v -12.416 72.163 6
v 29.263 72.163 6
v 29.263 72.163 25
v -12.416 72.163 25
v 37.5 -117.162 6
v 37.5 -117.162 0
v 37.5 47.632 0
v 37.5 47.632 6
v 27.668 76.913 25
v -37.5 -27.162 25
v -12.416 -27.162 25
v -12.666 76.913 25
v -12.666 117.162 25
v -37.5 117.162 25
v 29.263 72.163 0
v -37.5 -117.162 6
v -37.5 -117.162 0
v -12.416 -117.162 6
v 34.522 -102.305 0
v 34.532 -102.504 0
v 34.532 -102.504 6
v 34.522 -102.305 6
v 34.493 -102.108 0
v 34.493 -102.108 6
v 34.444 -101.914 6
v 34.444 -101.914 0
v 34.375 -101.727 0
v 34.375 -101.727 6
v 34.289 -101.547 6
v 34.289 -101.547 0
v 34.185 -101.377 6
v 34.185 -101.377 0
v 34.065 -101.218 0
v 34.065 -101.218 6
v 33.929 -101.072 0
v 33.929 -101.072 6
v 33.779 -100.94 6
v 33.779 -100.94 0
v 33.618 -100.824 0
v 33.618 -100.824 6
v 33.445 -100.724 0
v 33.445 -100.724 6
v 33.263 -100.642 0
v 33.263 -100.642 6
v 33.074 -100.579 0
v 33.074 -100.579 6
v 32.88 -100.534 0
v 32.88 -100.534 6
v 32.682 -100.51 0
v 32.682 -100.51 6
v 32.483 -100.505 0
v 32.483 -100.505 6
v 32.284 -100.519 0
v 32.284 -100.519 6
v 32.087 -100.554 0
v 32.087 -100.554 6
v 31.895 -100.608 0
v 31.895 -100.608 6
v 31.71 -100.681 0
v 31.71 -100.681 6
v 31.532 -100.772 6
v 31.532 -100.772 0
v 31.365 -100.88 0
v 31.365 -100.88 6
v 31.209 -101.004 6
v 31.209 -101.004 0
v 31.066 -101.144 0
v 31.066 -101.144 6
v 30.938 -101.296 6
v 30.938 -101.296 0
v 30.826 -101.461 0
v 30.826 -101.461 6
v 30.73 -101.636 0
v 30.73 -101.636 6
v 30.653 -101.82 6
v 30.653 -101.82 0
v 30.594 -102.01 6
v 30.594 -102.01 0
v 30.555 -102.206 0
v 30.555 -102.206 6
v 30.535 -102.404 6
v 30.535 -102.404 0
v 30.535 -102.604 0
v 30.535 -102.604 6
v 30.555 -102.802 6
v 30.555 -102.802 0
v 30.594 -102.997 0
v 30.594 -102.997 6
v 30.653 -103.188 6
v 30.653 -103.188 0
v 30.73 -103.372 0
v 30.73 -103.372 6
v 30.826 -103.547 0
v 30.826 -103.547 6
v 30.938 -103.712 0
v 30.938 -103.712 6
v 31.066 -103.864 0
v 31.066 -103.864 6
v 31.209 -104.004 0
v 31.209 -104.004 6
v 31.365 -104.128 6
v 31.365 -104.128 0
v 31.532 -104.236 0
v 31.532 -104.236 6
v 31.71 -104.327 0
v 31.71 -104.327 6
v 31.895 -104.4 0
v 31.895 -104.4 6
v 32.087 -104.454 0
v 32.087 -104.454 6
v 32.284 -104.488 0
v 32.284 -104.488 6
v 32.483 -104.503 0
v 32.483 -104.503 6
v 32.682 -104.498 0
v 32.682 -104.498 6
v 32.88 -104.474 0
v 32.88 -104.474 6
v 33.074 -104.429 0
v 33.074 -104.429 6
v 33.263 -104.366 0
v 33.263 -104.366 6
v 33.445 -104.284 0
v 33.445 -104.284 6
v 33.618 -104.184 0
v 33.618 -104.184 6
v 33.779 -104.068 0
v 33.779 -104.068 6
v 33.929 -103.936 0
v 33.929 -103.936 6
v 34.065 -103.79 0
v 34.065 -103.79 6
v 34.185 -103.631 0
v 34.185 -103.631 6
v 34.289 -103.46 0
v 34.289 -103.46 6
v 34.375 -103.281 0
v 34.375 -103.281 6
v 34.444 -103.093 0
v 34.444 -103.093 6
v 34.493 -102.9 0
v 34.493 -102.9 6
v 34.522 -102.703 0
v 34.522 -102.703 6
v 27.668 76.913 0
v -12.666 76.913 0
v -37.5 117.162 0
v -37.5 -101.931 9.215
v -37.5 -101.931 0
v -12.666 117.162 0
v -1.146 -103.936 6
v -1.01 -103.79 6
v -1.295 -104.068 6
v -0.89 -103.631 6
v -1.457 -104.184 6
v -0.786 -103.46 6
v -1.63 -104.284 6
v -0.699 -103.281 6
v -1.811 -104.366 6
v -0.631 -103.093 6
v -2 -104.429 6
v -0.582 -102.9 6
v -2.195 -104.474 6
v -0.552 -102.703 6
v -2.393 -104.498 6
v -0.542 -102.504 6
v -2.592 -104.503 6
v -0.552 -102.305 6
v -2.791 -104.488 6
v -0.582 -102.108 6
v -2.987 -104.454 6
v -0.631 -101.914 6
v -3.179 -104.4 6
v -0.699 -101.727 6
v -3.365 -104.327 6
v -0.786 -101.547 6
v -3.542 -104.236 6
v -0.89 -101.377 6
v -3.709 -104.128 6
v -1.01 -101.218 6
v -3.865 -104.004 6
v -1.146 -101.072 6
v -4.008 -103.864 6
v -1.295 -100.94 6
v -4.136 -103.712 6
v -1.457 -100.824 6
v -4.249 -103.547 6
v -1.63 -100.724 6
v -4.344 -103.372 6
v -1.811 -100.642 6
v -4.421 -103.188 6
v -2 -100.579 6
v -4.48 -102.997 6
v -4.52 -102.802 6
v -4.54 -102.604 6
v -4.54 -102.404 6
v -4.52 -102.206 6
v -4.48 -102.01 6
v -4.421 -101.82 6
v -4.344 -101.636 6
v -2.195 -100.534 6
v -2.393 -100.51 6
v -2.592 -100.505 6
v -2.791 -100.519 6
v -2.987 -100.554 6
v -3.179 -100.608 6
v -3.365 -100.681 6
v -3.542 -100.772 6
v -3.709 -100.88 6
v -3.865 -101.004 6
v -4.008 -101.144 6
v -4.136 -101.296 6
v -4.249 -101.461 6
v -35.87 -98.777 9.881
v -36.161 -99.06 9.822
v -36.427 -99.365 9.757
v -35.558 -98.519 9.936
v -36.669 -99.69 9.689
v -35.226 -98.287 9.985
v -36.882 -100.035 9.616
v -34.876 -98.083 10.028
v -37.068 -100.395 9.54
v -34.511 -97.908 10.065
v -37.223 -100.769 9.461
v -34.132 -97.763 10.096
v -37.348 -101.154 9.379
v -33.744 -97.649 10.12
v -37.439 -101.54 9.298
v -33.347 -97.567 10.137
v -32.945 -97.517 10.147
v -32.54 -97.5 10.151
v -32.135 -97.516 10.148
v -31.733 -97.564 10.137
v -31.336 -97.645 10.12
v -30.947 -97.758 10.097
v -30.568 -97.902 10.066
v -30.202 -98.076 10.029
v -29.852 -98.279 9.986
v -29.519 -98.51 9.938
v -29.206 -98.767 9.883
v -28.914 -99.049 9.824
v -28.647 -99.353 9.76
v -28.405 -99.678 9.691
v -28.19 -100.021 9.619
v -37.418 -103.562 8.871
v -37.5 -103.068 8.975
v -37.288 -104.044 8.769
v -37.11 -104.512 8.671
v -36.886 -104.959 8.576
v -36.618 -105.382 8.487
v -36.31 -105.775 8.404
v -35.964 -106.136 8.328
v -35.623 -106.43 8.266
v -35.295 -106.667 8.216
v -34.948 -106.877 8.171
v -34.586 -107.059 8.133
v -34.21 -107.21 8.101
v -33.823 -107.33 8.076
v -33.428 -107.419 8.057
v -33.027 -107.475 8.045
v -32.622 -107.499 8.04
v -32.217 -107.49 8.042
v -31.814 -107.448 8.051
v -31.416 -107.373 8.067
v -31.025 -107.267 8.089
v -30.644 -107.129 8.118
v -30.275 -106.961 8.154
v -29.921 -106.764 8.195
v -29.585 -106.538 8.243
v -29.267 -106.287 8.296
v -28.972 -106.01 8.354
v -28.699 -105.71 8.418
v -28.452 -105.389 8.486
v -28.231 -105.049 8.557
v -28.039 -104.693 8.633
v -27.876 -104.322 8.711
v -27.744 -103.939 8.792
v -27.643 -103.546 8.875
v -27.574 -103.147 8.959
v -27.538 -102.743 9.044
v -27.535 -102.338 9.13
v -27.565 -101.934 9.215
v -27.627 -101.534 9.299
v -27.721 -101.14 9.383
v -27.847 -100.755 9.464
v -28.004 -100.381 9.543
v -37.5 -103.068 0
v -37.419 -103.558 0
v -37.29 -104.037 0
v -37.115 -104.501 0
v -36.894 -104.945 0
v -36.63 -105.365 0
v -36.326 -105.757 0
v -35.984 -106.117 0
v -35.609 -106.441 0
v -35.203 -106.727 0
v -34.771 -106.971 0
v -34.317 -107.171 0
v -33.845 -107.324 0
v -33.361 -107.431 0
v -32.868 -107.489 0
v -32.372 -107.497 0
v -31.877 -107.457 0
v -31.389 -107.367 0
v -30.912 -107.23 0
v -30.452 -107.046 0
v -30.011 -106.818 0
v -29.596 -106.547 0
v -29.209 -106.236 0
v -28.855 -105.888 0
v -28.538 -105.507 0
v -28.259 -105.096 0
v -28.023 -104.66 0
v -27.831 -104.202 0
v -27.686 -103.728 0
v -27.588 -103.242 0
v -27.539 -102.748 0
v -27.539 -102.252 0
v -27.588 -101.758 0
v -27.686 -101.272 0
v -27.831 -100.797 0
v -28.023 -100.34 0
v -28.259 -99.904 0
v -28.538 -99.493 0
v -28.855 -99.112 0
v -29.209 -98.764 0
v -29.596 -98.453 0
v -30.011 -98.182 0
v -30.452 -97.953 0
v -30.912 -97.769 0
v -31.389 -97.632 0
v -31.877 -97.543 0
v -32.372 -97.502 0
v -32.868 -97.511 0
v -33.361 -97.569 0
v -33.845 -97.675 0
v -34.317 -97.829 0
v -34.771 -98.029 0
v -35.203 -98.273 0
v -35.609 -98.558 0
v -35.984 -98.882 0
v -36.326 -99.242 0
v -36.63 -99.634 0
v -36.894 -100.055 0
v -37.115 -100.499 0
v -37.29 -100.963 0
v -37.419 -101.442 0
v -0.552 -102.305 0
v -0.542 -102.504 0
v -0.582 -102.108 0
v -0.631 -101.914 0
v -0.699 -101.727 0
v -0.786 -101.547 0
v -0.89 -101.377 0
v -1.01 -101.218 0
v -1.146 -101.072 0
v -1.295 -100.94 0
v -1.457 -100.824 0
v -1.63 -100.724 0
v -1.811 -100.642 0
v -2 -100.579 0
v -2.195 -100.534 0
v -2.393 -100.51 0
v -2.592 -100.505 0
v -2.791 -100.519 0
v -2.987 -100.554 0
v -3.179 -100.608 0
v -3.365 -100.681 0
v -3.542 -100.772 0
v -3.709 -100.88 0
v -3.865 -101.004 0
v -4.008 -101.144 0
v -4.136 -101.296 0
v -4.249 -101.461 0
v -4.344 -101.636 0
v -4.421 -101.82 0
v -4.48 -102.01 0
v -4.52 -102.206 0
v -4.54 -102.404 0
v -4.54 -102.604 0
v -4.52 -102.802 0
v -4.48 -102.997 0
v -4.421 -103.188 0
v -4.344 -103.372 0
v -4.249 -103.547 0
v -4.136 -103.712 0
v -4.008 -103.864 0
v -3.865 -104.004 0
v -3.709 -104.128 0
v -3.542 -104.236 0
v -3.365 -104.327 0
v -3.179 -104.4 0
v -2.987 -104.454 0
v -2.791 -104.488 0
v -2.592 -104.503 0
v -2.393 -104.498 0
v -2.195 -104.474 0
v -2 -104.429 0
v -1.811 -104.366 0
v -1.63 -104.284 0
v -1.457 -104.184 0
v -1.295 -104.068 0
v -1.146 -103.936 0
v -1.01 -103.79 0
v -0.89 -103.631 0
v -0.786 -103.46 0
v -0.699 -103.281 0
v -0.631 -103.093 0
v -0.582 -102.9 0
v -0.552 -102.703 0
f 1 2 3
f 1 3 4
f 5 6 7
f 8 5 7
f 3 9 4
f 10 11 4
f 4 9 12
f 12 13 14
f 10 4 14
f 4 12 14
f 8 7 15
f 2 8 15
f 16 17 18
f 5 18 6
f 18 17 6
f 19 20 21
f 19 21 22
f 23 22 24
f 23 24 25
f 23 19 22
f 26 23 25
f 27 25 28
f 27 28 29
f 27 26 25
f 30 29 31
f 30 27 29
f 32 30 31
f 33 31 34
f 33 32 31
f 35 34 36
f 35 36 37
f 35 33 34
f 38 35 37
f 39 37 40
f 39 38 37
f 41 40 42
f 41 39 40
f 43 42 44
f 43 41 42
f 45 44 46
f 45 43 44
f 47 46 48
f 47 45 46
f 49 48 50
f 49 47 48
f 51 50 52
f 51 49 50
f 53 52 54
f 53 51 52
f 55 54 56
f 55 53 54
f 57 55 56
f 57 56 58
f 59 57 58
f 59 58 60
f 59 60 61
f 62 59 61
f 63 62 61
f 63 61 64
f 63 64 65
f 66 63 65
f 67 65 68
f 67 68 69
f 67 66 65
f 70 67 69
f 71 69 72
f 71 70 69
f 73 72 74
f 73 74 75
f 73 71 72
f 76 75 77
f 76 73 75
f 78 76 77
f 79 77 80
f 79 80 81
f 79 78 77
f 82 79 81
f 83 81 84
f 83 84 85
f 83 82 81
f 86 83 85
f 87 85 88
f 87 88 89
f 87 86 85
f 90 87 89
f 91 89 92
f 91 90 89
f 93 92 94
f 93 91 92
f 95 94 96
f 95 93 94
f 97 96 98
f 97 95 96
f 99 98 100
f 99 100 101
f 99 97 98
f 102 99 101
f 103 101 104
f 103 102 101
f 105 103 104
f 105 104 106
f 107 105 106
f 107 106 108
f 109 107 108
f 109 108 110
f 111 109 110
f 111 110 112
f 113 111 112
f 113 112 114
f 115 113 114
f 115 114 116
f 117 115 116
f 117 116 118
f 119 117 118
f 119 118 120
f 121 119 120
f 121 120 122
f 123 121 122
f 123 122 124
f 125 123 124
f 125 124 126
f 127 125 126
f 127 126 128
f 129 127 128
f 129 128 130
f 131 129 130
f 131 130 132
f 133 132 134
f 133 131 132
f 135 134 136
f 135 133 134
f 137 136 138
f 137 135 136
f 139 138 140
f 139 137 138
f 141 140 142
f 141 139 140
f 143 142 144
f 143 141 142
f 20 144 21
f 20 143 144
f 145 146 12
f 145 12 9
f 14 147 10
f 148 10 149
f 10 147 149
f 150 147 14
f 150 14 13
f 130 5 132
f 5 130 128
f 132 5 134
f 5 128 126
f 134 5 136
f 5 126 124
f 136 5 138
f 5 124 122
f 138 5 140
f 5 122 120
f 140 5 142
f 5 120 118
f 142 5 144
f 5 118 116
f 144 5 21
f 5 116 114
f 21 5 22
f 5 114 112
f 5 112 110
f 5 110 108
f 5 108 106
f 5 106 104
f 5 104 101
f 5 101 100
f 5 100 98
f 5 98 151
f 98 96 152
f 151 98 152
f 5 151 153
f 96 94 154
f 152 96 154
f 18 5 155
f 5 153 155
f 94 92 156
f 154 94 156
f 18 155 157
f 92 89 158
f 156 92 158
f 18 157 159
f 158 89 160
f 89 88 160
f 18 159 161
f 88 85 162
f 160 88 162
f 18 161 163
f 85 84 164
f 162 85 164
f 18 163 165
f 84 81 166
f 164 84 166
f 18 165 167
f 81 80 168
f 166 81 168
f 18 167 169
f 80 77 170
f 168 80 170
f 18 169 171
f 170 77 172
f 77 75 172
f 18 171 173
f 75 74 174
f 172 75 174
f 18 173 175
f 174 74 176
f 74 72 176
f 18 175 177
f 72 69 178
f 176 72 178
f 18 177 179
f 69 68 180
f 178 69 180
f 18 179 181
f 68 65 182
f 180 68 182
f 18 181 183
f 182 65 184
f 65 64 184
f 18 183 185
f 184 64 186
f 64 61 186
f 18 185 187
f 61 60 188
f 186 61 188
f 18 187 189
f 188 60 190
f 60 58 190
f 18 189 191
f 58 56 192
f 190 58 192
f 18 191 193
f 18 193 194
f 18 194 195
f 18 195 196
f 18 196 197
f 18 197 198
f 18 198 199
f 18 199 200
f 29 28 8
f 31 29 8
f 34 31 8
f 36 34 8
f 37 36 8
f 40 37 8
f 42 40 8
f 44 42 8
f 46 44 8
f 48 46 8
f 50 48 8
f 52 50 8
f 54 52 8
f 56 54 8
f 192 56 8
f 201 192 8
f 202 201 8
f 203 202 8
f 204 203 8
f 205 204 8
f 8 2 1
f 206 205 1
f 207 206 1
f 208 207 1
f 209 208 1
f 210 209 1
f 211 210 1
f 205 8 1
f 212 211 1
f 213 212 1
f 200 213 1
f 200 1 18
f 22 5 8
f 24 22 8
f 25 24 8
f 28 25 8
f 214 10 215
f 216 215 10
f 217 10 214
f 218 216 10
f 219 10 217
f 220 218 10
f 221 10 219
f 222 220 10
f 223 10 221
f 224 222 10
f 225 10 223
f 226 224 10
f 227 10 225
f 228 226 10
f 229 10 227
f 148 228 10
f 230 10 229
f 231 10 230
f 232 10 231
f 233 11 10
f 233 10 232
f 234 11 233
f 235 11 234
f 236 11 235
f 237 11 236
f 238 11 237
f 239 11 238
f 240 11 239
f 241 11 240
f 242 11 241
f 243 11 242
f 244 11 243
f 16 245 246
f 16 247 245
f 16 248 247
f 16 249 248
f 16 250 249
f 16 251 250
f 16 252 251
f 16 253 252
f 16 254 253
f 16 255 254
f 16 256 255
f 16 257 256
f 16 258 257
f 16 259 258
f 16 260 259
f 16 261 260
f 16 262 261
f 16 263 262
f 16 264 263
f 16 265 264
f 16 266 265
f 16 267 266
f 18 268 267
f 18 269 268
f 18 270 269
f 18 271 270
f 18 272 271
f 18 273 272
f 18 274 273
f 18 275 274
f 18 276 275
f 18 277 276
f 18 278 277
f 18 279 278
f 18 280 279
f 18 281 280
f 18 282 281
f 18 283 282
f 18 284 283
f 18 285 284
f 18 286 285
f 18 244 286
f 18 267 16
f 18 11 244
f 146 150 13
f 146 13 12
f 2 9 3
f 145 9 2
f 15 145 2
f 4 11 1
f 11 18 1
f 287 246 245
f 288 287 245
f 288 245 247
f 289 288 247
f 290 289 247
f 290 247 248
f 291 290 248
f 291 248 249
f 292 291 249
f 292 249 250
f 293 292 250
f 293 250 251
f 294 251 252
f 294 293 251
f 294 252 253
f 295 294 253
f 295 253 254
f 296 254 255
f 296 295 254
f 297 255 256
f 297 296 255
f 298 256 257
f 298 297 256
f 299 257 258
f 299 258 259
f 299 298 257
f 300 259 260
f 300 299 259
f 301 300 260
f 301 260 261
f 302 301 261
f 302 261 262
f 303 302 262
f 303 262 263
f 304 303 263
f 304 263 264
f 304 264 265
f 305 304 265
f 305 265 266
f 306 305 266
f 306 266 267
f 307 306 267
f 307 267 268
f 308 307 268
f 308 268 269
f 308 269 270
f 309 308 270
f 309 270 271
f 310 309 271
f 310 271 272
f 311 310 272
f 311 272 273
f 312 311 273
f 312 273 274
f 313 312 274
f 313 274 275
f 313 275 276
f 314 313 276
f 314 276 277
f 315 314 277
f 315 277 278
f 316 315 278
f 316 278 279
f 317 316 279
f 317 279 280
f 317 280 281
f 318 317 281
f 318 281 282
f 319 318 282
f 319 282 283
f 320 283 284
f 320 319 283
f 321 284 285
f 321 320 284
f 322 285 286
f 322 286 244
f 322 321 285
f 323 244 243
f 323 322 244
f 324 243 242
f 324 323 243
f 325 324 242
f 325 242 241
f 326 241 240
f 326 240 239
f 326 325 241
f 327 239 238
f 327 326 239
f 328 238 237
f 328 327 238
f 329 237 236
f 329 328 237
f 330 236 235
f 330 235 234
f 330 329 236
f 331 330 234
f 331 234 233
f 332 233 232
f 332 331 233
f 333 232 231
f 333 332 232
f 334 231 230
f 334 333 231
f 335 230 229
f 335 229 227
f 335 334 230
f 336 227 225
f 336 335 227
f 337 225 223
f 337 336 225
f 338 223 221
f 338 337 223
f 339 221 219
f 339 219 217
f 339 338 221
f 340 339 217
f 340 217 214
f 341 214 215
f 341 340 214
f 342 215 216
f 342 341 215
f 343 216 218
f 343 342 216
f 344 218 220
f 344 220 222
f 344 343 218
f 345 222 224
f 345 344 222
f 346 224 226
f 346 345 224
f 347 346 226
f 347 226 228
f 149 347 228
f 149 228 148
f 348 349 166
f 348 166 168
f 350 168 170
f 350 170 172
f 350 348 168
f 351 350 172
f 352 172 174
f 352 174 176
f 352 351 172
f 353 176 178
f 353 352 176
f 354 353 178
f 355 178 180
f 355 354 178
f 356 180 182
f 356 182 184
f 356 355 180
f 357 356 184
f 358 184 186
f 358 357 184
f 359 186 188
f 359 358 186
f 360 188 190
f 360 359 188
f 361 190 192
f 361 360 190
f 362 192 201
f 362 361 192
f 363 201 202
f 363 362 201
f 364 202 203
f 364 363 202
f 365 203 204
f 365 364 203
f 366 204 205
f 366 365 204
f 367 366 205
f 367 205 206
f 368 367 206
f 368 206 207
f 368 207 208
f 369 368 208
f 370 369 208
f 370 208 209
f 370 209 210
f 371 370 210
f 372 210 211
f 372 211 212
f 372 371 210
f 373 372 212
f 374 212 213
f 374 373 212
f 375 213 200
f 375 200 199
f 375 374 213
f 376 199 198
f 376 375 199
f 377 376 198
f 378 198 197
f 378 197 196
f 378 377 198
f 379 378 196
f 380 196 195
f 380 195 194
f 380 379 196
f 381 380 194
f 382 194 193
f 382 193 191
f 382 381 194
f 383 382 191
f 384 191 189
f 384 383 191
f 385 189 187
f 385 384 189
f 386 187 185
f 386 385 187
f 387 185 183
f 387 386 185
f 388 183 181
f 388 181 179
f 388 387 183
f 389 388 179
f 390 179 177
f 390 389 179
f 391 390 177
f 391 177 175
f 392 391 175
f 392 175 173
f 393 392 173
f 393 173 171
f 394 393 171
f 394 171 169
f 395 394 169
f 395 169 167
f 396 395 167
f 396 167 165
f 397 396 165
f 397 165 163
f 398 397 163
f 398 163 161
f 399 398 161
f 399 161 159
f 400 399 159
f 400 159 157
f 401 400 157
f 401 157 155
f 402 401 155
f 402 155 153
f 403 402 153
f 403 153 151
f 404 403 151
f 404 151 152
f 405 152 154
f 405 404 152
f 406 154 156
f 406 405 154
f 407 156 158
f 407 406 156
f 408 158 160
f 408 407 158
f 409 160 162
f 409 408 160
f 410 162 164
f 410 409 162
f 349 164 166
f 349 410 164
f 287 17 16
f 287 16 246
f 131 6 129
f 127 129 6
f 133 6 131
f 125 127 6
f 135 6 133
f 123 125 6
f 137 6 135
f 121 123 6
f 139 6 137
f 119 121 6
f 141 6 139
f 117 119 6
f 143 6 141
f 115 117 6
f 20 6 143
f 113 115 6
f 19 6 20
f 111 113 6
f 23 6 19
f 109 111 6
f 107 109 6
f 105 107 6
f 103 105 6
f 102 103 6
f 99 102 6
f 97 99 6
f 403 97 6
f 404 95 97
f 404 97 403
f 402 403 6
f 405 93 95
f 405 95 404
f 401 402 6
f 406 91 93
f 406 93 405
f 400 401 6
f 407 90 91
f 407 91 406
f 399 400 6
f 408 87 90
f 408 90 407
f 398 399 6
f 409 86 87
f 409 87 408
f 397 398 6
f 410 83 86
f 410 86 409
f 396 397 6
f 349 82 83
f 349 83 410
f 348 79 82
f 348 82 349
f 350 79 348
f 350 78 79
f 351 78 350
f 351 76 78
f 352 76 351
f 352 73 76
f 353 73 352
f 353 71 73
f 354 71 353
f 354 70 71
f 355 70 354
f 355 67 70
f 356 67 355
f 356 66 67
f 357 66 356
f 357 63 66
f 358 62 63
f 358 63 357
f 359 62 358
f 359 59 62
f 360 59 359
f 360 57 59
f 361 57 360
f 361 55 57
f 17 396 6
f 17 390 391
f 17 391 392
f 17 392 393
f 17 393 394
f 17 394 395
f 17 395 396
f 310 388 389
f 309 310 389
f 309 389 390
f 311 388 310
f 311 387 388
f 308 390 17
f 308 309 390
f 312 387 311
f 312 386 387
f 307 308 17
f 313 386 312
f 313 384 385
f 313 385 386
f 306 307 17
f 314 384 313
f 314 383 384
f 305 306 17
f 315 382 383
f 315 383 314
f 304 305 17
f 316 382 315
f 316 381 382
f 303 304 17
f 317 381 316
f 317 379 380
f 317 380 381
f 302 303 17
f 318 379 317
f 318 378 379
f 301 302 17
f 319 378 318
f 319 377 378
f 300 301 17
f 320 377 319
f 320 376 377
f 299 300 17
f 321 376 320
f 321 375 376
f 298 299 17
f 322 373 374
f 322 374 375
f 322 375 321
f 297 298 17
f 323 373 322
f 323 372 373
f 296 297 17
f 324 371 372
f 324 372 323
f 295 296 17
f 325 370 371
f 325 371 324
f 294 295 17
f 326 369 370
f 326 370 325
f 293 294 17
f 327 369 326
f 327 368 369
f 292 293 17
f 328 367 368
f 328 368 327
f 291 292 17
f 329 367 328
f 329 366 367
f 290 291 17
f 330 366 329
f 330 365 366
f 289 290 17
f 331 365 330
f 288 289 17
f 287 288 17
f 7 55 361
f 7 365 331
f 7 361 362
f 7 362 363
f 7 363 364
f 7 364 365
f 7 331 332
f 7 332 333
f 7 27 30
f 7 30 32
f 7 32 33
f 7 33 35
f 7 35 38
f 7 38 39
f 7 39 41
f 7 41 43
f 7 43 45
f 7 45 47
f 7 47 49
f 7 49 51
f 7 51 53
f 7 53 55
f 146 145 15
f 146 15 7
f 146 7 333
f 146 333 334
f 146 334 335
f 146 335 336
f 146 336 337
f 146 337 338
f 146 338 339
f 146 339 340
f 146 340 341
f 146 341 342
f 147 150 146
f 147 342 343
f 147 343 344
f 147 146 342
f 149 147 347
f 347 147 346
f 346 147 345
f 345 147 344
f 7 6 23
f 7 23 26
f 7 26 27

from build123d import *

# Parameters (mm, degrees)
SKETCH1_R           = 2
BOSS_EXTRUDE1_DEPTH = 6
BOSS_EXTRUDE2_DEPTH = 25
CUT_EXTRUDE1_DEPTH  = 26


with BuildPart() as part:
    # Sketch1 → Boss-Extrude1 (new body)
    with BuildSketch(Plane.XY):
        with BuildLine():
            ThreePointArc((-37.5, -101.931361022), (-27.5324139, -102.499769625), (-37.5, -103.068178229))
            Line((-37.5, -103.068178229), (-37.5, -117.1625))
            Line((-37.5, -117.1625), (37.5, -117.1625))
            Line((37.5, -117.1625), (37.5, 47.631763907))
            Line((37.5, 47.631763907), (27.667562569, 76.912960749))
            Line((27.667562569, 76.912960749), (-12.666, 76.912960749))
            Line((-12.666, 76.912960749), (-12.666, 117.1625))
            Line((-12.666, 117.1625), (-37.5, 117.1625))
            Line((-37.5, 117.1625), (-37.5, -101.931361022))
        make_face()
        with Locations((32.5324139, -102.503947692)):
            Circle(SKETCH1_R, mode=Mode.SUBTRACT)
        with Locations((-2.542, -102.503947692)):
            Circle(SKETCH1_R, mode=Mode.SUBTRACT)
    extrude(amount=BOSS_EXTRUDE1_DEPTH)

    # Sketch1<4> → Boss-Extrude2 (add)
    with BuildSketch(Plane.XY):
        with BuildLine():
            ThreePointArc((-37.5, -101.931361022), (-27.5324139, -102.499769625), (-37.5, -103.068178229))
            Line((-37.5, -103.068178229), (-37.5, -117.1625))
            Line((-37.5, -117.1625), (-12.416, -117.1625))
            Line((-12.416, -117.1625), (-12.416, 72.162960749))
            Line((-12.416, 72.162960749), (29.262581996, 72.162960749))
            Line((29.262581996, 72.162960749), (27.667562569, 76.912960749))
            Line((27.667562569, 76.912960749), (-12.666, 76.912960749))
            Line((-12.666, 76.912960749), (-12.666, 117.1625))
            Line((-12.666, 117.1625), (-37.5, 117.1625))
            Line((-37.5, 117.1625), (-37.5, -101.931361022))
        make_face()
    extrude(amount=BOSS_EXTRUDE2_DEPTH)

    # Sketch2 → Cut-Extrude1 (cut)
    with BuildSketch(Plane(origin=(-12.416, 0, 0), x_dir=(0, 0, -1), z_dir=(1, 0, 0))):
        Polygon((-25, -27.1625), (-6, -117.1625), (-25, -117.1625), align=None)
    extrude(amount=-CUT_EXTRUDE1_DEPTH, mode=Mode.SUBTRACT)


solid = part.part
